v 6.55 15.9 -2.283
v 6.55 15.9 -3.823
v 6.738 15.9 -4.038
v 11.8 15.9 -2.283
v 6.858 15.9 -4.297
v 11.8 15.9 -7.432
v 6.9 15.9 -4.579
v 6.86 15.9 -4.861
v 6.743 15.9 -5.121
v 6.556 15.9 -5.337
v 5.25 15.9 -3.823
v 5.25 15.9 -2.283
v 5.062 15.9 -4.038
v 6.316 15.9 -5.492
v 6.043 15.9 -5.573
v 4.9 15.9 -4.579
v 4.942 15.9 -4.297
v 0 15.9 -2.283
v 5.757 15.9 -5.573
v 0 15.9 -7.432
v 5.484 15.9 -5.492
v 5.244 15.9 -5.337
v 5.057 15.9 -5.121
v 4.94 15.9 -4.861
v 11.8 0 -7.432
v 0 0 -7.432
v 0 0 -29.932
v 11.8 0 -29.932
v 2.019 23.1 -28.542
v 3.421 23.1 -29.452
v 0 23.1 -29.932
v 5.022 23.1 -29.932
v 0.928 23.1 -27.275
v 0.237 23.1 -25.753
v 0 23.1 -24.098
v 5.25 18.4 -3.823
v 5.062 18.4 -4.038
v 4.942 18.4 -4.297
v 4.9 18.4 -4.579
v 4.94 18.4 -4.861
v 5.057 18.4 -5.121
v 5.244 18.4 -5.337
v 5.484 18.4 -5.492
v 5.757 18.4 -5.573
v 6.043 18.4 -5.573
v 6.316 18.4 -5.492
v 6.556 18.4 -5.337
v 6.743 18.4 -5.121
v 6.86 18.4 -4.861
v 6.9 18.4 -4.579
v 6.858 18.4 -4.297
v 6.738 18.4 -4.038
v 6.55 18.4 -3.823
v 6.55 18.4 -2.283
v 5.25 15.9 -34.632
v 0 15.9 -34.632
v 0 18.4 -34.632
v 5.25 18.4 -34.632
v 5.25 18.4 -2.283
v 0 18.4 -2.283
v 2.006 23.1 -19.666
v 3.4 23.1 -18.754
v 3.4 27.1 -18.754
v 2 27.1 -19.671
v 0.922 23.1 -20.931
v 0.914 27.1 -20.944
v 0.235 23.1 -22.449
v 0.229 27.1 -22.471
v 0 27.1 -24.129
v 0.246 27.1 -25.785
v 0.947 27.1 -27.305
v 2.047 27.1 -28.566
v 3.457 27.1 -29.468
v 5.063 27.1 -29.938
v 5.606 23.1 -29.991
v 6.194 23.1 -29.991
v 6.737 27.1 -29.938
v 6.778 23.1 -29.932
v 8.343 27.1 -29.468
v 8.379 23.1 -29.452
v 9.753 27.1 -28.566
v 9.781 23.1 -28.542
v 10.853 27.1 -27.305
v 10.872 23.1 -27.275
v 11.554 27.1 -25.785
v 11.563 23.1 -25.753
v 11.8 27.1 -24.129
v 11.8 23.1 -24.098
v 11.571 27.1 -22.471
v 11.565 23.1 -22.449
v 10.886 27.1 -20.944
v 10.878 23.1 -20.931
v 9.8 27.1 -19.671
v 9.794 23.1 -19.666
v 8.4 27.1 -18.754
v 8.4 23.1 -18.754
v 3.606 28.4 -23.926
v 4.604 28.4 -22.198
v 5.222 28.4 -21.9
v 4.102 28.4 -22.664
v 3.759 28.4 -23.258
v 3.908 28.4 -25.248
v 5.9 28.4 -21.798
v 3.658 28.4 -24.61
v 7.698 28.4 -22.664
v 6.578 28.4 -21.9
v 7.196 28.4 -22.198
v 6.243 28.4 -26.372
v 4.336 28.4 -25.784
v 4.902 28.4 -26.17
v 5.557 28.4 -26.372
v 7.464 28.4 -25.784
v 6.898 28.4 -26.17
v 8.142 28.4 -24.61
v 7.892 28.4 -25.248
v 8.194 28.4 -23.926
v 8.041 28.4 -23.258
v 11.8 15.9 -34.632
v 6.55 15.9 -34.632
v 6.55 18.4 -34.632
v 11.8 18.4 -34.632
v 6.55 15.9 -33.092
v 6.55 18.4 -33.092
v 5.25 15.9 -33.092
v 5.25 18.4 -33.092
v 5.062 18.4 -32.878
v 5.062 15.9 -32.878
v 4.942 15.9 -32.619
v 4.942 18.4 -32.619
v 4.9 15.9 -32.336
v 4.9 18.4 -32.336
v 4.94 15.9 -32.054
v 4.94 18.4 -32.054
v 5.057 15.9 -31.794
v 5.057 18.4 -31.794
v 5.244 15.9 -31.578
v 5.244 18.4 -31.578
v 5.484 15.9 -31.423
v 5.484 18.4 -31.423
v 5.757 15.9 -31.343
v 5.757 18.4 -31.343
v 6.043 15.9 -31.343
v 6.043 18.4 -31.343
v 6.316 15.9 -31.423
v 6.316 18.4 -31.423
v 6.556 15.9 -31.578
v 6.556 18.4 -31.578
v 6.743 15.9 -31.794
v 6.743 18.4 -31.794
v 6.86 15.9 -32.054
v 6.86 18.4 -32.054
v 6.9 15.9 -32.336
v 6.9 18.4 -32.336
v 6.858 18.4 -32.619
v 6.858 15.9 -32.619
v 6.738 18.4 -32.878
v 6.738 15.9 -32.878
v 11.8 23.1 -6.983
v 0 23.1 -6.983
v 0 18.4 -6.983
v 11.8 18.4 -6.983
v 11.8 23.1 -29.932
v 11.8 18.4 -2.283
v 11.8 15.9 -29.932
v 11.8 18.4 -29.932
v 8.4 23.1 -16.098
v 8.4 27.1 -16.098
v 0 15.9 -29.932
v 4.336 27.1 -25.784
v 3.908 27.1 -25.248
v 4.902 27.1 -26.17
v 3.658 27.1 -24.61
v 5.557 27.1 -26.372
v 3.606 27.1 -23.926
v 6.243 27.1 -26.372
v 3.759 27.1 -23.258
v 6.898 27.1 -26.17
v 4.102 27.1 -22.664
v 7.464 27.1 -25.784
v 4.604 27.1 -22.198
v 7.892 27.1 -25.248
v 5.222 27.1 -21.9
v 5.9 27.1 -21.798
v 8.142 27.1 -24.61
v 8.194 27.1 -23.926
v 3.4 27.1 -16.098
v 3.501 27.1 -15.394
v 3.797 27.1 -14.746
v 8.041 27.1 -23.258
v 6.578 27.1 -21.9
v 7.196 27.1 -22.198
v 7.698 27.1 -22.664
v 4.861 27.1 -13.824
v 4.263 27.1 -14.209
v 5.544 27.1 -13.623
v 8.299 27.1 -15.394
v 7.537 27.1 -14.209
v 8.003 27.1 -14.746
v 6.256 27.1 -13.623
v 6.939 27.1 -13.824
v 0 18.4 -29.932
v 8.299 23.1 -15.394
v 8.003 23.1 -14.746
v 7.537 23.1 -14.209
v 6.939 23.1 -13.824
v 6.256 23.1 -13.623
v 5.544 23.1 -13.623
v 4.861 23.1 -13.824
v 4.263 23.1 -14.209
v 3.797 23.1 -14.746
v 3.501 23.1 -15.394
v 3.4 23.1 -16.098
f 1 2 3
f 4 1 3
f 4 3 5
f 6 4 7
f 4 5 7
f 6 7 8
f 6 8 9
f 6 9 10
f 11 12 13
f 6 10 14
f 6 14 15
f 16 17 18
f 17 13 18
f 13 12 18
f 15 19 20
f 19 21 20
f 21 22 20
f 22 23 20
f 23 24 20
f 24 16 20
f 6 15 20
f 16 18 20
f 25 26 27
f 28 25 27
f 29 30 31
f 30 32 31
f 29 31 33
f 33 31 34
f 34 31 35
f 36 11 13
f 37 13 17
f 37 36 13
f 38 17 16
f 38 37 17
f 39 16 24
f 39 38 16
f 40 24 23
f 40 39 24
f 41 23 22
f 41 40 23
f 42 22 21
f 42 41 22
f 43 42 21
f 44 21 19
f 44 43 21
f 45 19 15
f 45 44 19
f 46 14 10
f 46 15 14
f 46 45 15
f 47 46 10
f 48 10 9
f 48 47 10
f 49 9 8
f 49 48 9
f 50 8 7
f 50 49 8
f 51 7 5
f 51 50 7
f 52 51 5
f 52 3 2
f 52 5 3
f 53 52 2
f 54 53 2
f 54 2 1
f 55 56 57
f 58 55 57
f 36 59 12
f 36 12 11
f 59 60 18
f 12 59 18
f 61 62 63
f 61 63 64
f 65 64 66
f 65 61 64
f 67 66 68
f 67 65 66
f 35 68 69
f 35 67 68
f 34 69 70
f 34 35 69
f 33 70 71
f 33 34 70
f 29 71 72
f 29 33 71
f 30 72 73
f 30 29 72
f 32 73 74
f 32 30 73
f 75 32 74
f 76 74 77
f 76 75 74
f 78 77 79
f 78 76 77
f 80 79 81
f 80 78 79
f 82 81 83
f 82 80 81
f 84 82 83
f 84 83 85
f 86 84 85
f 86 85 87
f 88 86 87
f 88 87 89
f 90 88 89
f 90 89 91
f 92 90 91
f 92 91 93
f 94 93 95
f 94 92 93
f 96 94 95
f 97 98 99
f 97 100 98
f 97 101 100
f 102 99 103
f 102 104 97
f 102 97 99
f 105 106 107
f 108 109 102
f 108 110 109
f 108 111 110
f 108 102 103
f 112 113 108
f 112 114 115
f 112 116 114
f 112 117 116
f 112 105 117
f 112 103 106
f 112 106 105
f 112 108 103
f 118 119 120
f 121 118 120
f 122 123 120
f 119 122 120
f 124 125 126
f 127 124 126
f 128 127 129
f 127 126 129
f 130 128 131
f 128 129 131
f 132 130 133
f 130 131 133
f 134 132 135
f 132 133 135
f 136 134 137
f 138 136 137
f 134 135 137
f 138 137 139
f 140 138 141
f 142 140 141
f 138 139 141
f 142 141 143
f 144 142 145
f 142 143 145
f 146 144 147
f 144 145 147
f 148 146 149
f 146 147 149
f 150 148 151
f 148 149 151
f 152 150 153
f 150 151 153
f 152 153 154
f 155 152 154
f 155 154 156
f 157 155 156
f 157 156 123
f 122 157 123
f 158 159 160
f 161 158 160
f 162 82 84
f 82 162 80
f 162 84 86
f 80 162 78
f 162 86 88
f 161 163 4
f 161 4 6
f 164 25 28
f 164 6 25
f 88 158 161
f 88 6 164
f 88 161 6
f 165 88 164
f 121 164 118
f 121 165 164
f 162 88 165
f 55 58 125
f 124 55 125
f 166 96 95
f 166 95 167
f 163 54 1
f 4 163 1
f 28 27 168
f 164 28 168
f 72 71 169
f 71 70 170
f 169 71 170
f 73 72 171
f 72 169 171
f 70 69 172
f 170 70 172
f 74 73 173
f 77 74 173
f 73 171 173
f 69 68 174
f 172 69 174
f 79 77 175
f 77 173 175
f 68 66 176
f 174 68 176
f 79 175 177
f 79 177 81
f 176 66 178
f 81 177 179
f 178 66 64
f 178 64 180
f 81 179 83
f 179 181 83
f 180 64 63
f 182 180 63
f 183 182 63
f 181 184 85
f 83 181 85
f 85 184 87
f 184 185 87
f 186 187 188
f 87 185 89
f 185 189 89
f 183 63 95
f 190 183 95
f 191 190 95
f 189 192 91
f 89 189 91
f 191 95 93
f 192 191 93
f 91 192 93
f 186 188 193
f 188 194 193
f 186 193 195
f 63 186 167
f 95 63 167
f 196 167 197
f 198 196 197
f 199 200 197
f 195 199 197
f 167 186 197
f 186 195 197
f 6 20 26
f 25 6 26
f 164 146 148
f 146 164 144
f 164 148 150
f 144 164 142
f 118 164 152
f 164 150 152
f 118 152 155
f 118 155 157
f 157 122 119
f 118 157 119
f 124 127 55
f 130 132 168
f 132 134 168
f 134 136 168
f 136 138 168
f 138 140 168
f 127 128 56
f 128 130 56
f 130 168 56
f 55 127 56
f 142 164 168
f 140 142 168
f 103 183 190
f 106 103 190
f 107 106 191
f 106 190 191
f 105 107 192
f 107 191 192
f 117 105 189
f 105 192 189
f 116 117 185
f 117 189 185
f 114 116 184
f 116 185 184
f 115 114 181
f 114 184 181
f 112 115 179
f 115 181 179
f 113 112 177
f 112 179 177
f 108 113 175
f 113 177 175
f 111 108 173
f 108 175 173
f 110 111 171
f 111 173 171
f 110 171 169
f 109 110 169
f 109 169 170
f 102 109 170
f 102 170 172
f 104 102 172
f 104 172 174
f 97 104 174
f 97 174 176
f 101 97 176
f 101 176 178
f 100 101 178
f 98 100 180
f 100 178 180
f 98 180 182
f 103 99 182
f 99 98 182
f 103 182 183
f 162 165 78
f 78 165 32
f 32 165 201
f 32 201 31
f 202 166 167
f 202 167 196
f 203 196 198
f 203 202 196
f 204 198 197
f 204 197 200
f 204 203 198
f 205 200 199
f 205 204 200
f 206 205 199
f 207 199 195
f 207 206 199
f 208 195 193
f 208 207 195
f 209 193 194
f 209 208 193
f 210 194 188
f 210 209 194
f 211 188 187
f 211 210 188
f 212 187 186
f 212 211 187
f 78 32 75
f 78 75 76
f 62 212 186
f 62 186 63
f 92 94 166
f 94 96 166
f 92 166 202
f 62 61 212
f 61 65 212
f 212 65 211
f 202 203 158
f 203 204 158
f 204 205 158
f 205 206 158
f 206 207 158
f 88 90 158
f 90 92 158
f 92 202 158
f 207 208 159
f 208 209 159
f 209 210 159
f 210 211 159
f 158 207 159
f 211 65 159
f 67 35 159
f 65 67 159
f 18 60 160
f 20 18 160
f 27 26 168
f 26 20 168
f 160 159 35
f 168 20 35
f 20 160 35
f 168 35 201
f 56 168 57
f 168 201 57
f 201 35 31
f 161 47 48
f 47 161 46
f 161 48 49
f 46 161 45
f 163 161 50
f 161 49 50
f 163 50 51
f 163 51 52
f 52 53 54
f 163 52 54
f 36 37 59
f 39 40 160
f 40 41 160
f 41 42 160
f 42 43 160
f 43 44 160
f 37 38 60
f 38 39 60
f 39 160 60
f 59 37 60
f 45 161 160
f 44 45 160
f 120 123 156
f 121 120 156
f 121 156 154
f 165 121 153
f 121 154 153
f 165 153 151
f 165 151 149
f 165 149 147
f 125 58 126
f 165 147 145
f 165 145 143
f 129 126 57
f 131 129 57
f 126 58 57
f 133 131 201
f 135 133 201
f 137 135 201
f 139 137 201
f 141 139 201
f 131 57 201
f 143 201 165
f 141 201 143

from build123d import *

# Parameters (mm, degrees)
BOSS_EXTRUDE1_DEPTH   = 11.8
BOSS_EXTRUDE2_DEPTH   = 4
SKETCH4_R             = 2.3
BOSS_EXTRUDE3_DEPTH   = 3.2
SKETCH5_R             = 0.85
CUT_EXTRUDE1_DEPTH    = 1
CUT_EXTRUDE2_DEPTH    = 10
MOVER_START           = 28.4
MOVER_FACE2_OUTLINE_R = 2.3
MOVER_FACE2_DEPTH     = 1.9


# Read off the part's stored shape, not the designer's step: Mover face2
with BuildPart() as part:
    # Sketch2 → Boss-Extrude1 (new body)
    with BuildSketch(Plane(origin=(0, 0, 0), x_dir=(0, 0, -1), z_dir=(1, 0, 0))):
        Polygon((7.432291728, 0), (29.932291728, 0), (29.932291728, 15.9), (34.632291728, 15.9), (34.632291728, 18.4), (29.932291728, 18.4), (29.932291728, 23.1), (6.982957442, 23.1), (6.982957442, 18.4), (2.282957442, 18.4), (2.282957442, 15.9), (7.432291728, 15.9), align=None)
    extrude(amount=BOSS_EXTRUDE1_DEPTH)

    # Sketch3 → Boss-Extrude2 (add)
    with BuildSketch(Plane(origin=(0, 23.1, 0), x_dir=(-1, 0, 0), z_dir=(0, 1, 0))):
        with BuildLine():
            Line((-3.4, -16.098037438), (-3.4, -18.753881751))
            ThreePointArc((-3.4, -18.753881751), (-5.9, -29.998037438), (-8.4, -18.753881751))
            Line((-8.4, -18.753881751), (-8.4, -16.098037438))
            ThreePointArc((-8.4, -16.098037438), (-5.9, -13.598037438), (-3.4, -16.098037438))
        make_face()
    extrude(amount=BOSS_EXTRUDE2_DEPTH)

    # Sketch4 → Boss-Extrude3 (add)
    with BuildSketch(Plane(origin=(0, 27.1, 0), x_dir=(-1, 0, 0), z_dir=(0, 1, 0))):
        with Locations(Location((-5.9, -24.098037438, 0), (0, 0, 90))):
            Circle(SKETCH4_R)
    extrude(amount=BOSS_EXTRUDE3_DEPTH)

    # Sketch5 → Cut-Extrude1 (cut)
    with BuildSketch(Plane(origin=(0, 30.3, 0), x_dir=(1, 0, 0), z_dir=(0, 1, 0))):
        with Locations(Location((5.9, 24.098037438, 0), (0, 0, 270))):
            Circle(SKETCH5_R)
    extrude(amount=-CUT_EXTRUDE1_DEPTH, mode=Mode.SUBTRACT)

    # Sketch6 → Cut-Extrude2 (cut)
    with BuildSketch(Plane(origin=(0, 18.4, 0), x_dir=(1, 0, 0), z_dir=(0, 1, 0))):
        with BuildLine():
            Line((6.55, 2.282957442), (5.25, 2.282957442))
            Line((5.25, 2.282957442), (5.25, 3.823023234))
            ThreePointArc((5.25, 3.823023234), (5.9, 5.582957442), (6.55, 3.823023234))
            Line((6.55, 3.823023234), (6.55, 2.282957442))
        make_face()
        with BuildLine():
            Line((6.55, 34.632291728), (5.25, 34.632291728))
            Line((5.25, 34.632291728), (5.25, 33.092225935))
            ThreePointArc((5.25, 33.092225935), (5.9, 31.332291728), (6.55, 33.092225935))
            Line((6.55, 33.092225935), (6.55, 34.632291728))
        make_face()
    extrude(amount=-CUT_EXTRUDE2_DEPTH, mode=Mode.SUBTRACT)

    # Mover face2 outline → Mover face2 (cut)
    with BuildSketch(Plane(origin=(0, 0, 0), x_dir=(1, 0, 0), z_dir=(0, 1, 0)).offset(MOVER_START)):
        with Locations((5.9, 24.098037438)):
            Circle(MOVER_FACE2_OUTLINE_R)
    extrude(amount=MOVER_FACE2_DEPTH, mode=Mode.SUBTRACT)


solid = part.part
